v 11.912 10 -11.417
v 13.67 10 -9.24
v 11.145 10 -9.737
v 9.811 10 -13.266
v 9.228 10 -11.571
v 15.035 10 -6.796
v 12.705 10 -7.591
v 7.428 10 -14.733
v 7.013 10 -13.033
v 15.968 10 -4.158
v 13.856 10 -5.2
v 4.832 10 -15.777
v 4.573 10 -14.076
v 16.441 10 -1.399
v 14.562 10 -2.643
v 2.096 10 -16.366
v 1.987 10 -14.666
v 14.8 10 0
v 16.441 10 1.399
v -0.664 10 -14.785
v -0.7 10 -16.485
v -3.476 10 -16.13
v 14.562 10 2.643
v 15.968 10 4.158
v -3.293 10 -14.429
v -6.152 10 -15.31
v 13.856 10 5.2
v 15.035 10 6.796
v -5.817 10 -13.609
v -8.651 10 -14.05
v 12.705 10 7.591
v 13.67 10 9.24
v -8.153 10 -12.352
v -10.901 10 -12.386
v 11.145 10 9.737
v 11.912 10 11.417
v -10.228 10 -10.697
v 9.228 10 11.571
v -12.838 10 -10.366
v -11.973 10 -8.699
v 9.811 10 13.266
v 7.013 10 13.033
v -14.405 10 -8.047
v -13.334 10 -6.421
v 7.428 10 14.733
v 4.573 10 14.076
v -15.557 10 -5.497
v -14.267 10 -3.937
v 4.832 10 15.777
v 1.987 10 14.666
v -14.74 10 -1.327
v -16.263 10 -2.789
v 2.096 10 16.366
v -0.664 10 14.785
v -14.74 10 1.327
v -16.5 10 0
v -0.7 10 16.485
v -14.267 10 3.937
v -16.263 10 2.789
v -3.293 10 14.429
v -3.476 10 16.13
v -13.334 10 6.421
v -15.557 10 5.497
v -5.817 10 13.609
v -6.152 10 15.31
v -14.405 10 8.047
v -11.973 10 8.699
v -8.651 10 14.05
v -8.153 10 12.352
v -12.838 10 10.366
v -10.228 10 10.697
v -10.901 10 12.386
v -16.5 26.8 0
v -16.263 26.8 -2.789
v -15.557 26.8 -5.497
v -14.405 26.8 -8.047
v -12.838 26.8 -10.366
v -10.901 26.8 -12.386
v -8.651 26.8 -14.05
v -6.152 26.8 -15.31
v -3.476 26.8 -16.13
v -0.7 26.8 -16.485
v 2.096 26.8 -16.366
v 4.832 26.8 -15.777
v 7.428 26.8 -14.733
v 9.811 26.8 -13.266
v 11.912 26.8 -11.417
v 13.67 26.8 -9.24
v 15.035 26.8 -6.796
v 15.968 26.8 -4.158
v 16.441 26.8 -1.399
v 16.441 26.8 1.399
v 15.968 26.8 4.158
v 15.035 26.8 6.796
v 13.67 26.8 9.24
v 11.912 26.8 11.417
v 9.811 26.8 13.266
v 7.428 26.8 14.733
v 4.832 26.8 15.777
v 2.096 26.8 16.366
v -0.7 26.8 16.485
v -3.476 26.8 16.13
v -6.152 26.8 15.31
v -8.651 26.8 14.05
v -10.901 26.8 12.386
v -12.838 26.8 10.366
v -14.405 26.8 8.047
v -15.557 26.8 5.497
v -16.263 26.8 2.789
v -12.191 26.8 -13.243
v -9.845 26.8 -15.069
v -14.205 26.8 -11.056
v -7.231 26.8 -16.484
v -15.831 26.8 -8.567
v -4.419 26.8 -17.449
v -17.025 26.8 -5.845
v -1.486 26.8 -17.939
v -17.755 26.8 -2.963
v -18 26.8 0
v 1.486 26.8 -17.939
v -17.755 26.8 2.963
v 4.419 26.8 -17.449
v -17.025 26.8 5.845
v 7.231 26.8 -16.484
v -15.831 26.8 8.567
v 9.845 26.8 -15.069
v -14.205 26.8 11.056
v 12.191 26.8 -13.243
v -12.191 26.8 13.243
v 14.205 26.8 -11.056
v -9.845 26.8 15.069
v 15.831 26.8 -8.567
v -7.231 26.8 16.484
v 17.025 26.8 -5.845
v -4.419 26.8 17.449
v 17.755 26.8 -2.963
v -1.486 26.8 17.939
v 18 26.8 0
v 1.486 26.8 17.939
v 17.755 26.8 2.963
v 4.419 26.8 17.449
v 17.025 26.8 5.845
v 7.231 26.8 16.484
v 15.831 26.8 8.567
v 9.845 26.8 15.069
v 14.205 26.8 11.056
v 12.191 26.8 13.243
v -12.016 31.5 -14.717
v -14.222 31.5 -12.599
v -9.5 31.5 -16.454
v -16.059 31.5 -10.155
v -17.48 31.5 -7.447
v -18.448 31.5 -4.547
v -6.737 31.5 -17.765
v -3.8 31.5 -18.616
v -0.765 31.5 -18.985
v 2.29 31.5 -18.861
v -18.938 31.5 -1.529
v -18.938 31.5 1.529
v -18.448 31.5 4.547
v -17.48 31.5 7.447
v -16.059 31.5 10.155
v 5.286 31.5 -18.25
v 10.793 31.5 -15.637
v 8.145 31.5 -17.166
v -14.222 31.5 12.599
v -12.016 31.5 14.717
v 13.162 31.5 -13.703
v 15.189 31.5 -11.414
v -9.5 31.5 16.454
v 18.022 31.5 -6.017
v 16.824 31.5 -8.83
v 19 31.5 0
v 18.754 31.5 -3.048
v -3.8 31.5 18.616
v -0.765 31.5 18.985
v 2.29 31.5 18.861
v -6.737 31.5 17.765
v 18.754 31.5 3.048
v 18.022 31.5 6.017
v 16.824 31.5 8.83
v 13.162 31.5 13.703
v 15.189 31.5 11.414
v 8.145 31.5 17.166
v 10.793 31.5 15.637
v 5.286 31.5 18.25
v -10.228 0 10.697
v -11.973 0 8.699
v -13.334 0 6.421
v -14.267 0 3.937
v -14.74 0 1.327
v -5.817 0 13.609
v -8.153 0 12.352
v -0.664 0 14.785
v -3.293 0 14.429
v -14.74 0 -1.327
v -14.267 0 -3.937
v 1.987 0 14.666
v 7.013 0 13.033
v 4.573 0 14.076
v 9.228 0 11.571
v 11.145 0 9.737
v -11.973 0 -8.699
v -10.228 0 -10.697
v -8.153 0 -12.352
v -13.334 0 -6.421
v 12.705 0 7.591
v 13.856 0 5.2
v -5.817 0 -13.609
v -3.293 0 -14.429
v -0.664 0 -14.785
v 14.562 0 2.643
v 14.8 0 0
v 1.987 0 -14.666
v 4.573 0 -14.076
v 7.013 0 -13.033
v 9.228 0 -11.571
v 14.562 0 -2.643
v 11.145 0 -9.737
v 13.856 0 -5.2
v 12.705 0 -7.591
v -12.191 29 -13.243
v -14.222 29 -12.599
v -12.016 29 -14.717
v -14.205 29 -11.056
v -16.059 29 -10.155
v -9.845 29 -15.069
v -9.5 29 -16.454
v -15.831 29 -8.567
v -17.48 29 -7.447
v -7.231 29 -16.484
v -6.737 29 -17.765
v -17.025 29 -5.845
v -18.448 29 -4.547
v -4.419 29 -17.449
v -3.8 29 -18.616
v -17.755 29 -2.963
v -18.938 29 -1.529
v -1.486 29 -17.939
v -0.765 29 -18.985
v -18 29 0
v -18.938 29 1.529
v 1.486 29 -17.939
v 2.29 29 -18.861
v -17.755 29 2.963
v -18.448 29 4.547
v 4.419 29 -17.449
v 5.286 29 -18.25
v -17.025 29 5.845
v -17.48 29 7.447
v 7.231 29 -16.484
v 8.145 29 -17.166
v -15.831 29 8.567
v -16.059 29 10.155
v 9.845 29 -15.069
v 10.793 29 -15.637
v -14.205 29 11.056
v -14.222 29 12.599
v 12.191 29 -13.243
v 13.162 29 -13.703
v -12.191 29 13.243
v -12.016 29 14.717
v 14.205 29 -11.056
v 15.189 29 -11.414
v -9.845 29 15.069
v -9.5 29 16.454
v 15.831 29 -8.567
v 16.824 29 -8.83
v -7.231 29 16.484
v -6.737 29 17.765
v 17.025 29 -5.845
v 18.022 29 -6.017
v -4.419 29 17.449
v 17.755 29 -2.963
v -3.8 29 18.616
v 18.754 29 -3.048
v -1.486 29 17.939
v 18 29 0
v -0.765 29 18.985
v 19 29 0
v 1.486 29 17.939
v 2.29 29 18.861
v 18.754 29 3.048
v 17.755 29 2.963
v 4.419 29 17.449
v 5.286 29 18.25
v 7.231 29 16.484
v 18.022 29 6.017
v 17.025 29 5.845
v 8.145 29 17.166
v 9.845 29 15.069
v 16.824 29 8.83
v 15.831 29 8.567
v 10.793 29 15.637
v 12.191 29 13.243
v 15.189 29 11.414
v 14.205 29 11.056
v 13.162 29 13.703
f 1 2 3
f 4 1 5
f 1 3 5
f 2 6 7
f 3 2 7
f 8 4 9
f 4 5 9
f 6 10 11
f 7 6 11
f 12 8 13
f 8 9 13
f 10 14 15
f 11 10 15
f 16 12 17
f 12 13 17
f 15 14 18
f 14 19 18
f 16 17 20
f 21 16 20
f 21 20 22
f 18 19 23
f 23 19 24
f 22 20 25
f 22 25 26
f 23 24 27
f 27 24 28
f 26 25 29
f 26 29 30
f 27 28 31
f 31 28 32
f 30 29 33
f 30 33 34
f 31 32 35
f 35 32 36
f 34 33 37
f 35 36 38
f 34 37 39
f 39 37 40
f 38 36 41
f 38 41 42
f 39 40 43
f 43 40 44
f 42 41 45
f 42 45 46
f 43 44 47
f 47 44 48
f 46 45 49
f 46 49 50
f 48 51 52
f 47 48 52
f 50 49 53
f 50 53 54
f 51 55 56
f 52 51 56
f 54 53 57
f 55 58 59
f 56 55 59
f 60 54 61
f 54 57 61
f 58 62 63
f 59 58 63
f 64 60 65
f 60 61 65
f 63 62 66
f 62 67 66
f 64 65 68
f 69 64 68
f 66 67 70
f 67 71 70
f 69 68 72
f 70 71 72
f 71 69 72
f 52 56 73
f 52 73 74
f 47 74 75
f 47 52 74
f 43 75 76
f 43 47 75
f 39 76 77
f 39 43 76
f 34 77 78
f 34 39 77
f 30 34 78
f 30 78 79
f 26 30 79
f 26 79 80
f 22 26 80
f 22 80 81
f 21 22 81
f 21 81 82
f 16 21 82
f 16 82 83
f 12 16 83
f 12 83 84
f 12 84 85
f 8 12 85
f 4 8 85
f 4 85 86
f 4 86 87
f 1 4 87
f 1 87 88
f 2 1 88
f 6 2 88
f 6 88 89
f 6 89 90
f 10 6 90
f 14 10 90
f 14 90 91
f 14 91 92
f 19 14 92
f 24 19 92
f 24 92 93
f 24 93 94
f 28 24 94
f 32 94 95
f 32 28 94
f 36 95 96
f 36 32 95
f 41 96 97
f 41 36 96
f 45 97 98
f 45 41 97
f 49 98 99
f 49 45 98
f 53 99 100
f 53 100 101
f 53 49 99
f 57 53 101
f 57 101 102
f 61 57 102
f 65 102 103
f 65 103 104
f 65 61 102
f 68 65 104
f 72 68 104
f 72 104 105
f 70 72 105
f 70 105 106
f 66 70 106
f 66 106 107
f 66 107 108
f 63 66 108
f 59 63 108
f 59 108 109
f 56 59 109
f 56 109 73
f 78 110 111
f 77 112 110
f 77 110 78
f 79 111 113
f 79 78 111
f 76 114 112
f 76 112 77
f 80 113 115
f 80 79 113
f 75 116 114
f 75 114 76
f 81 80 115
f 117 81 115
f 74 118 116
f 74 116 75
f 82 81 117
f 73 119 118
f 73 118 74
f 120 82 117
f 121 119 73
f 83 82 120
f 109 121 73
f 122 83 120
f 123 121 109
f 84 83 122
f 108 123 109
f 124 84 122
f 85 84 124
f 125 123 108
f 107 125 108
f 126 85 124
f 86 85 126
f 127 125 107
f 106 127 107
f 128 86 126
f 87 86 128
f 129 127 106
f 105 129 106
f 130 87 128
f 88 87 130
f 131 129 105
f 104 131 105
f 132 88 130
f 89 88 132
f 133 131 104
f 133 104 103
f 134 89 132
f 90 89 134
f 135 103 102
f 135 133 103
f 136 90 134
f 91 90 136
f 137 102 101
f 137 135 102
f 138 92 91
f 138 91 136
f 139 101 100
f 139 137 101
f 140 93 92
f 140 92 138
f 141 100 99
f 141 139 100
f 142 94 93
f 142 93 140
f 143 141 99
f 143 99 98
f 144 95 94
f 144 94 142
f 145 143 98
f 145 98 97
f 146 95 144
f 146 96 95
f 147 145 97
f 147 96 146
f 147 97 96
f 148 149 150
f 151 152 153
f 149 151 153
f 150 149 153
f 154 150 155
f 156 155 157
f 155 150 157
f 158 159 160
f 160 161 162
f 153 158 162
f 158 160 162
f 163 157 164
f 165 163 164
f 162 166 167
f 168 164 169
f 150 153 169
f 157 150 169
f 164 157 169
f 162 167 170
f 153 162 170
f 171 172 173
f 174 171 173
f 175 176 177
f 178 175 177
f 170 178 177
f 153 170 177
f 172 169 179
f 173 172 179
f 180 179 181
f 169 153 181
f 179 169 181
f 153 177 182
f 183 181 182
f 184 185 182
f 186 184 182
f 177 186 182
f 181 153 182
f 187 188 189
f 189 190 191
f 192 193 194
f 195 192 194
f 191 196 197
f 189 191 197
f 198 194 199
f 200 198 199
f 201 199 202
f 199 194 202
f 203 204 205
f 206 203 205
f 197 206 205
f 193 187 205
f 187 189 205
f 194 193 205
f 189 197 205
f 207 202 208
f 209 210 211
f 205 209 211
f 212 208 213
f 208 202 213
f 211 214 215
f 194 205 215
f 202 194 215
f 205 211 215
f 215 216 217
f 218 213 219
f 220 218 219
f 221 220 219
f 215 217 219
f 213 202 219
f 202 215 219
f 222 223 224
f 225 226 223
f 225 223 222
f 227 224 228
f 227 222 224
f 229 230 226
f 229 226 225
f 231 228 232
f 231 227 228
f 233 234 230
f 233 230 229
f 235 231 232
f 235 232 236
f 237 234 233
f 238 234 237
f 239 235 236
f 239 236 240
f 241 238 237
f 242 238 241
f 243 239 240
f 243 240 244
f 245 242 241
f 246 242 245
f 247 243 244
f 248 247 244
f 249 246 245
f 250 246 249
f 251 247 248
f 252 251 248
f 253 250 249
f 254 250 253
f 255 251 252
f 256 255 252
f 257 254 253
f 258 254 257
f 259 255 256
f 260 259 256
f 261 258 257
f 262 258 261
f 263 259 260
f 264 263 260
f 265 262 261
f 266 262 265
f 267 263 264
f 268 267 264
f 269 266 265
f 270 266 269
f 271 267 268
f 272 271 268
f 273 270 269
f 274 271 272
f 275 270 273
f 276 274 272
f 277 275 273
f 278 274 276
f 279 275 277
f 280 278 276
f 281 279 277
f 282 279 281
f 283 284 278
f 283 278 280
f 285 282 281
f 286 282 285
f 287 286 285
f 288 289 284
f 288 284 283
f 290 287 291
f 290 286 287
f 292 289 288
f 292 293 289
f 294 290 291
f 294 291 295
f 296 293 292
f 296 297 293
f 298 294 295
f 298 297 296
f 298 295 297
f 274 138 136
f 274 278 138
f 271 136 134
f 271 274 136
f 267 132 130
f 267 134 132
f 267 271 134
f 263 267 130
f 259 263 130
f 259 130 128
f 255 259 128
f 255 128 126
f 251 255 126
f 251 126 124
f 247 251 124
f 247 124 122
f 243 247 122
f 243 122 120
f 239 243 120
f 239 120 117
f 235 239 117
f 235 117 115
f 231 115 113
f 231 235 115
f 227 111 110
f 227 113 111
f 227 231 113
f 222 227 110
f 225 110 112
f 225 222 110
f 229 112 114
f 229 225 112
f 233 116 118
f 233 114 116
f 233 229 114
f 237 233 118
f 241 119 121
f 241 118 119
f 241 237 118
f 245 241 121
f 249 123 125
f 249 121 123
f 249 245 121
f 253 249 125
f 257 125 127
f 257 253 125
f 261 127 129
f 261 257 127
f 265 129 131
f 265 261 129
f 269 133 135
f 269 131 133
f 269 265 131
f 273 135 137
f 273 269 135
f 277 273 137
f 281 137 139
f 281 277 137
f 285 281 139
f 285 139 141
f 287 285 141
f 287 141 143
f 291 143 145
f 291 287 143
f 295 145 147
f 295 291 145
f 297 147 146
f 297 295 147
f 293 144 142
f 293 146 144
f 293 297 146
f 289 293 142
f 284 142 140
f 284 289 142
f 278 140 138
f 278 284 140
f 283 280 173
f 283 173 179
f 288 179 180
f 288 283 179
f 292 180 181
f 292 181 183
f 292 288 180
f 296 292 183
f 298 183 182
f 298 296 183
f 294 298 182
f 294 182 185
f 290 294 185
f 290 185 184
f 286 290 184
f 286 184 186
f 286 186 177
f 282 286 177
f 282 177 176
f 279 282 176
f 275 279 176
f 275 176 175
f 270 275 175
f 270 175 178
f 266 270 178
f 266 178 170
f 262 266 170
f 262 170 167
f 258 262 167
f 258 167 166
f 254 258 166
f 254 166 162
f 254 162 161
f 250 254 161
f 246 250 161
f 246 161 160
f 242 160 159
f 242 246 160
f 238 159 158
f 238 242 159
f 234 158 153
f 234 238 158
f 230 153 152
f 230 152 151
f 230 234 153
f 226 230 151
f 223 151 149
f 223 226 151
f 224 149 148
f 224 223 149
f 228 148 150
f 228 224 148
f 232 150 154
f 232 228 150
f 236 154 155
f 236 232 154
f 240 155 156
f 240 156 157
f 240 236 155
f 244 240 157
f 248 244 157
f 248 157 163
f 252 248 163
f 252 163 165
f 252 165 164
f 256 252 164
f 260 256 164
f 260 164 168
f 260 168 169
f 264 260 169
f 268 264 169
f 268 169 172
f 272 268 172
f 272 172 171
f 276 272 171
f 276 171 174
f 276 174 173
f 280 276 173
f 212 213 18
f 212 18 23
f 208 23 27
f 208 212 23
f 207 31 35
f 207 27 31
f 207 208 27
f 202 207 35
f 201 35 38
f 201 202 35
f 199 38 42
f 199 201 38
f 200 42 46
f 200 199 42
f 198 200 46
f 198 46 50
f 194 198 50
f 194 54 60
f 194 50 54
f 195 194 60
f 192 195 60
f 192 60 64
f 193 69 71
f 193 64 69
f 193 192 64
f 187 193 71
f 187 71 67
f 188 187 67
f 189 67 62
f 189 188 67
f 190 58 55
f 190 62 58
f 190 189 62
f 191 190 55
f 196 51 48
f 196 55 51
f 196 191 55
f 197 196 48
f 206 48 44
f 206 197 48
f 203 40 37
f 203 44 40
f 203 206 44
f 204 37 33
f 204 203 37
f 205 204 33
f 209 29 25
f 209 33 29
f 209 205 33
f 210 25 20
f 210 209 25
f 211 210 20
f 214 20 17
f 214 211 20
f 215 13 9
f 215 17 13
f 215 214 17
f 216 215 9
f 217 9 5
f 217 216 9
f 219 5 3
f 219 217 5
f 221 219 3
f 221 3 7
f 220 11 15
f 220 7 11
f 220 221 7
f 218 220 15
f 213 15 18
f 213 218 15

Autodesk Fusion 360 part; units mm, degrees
sketch "スケッチ1" plane through (0, 0, 0) normal (0, 1, 0) x (1, 0, 0)
  circle A0 centre (0, 0) radius 14.8
  dimension "d1" = 29.6
extrude "押し出し1" add sketch "スケッチ1" along normal blind 10
sketch "スケッチ2" plane through (0, 10, 0) normal (0, 1, 0) x (-1, 0, 0)
  circle A0 centre (0, 0) radius 14.8
  circle A1 centre (0, 0) radius 16.5
  dimension "d4" = 33
extrude "押し出し2" add sketch "スケッチ2" along normal blind 19 contours A0 | A1
ref_plane "作業平面1" through (0, 24, 0) normal (0, 1, 0) x (-1, 0, 0)
sketch "スケッチ3" plane through (0, 24, 0) normal (0, 1, 0) x (1, 0, 0)
ref_plane "作業平面2" through (0, 29, 0) normal (0, -1, 0) x (-1, 0, 0)
sketch "スケッチ5" plane through (0, 29, 0) normal (0, -1, 0) x (1, 0, 0)
  circle A0 centre (0, 0) radius 19
  dimension "d12" = 38
extrude "押し出し4" add sketch "スケッチ5" against normal blind 2.5
sketch "スケッチ6" plane through (0, 29, 0) normal (0, -1, 0) x (1, 0, 0)
  circle A0 centre (0, 0) radius 18
  dimension "d15" = 36
extrude "押し出し5" add sketch "スケッチ6" along normal blind 2.2
ref_plane "作業平面4" through (0, 24.8, 0) normal (0, -1, 0) x (1, 0, 0)
